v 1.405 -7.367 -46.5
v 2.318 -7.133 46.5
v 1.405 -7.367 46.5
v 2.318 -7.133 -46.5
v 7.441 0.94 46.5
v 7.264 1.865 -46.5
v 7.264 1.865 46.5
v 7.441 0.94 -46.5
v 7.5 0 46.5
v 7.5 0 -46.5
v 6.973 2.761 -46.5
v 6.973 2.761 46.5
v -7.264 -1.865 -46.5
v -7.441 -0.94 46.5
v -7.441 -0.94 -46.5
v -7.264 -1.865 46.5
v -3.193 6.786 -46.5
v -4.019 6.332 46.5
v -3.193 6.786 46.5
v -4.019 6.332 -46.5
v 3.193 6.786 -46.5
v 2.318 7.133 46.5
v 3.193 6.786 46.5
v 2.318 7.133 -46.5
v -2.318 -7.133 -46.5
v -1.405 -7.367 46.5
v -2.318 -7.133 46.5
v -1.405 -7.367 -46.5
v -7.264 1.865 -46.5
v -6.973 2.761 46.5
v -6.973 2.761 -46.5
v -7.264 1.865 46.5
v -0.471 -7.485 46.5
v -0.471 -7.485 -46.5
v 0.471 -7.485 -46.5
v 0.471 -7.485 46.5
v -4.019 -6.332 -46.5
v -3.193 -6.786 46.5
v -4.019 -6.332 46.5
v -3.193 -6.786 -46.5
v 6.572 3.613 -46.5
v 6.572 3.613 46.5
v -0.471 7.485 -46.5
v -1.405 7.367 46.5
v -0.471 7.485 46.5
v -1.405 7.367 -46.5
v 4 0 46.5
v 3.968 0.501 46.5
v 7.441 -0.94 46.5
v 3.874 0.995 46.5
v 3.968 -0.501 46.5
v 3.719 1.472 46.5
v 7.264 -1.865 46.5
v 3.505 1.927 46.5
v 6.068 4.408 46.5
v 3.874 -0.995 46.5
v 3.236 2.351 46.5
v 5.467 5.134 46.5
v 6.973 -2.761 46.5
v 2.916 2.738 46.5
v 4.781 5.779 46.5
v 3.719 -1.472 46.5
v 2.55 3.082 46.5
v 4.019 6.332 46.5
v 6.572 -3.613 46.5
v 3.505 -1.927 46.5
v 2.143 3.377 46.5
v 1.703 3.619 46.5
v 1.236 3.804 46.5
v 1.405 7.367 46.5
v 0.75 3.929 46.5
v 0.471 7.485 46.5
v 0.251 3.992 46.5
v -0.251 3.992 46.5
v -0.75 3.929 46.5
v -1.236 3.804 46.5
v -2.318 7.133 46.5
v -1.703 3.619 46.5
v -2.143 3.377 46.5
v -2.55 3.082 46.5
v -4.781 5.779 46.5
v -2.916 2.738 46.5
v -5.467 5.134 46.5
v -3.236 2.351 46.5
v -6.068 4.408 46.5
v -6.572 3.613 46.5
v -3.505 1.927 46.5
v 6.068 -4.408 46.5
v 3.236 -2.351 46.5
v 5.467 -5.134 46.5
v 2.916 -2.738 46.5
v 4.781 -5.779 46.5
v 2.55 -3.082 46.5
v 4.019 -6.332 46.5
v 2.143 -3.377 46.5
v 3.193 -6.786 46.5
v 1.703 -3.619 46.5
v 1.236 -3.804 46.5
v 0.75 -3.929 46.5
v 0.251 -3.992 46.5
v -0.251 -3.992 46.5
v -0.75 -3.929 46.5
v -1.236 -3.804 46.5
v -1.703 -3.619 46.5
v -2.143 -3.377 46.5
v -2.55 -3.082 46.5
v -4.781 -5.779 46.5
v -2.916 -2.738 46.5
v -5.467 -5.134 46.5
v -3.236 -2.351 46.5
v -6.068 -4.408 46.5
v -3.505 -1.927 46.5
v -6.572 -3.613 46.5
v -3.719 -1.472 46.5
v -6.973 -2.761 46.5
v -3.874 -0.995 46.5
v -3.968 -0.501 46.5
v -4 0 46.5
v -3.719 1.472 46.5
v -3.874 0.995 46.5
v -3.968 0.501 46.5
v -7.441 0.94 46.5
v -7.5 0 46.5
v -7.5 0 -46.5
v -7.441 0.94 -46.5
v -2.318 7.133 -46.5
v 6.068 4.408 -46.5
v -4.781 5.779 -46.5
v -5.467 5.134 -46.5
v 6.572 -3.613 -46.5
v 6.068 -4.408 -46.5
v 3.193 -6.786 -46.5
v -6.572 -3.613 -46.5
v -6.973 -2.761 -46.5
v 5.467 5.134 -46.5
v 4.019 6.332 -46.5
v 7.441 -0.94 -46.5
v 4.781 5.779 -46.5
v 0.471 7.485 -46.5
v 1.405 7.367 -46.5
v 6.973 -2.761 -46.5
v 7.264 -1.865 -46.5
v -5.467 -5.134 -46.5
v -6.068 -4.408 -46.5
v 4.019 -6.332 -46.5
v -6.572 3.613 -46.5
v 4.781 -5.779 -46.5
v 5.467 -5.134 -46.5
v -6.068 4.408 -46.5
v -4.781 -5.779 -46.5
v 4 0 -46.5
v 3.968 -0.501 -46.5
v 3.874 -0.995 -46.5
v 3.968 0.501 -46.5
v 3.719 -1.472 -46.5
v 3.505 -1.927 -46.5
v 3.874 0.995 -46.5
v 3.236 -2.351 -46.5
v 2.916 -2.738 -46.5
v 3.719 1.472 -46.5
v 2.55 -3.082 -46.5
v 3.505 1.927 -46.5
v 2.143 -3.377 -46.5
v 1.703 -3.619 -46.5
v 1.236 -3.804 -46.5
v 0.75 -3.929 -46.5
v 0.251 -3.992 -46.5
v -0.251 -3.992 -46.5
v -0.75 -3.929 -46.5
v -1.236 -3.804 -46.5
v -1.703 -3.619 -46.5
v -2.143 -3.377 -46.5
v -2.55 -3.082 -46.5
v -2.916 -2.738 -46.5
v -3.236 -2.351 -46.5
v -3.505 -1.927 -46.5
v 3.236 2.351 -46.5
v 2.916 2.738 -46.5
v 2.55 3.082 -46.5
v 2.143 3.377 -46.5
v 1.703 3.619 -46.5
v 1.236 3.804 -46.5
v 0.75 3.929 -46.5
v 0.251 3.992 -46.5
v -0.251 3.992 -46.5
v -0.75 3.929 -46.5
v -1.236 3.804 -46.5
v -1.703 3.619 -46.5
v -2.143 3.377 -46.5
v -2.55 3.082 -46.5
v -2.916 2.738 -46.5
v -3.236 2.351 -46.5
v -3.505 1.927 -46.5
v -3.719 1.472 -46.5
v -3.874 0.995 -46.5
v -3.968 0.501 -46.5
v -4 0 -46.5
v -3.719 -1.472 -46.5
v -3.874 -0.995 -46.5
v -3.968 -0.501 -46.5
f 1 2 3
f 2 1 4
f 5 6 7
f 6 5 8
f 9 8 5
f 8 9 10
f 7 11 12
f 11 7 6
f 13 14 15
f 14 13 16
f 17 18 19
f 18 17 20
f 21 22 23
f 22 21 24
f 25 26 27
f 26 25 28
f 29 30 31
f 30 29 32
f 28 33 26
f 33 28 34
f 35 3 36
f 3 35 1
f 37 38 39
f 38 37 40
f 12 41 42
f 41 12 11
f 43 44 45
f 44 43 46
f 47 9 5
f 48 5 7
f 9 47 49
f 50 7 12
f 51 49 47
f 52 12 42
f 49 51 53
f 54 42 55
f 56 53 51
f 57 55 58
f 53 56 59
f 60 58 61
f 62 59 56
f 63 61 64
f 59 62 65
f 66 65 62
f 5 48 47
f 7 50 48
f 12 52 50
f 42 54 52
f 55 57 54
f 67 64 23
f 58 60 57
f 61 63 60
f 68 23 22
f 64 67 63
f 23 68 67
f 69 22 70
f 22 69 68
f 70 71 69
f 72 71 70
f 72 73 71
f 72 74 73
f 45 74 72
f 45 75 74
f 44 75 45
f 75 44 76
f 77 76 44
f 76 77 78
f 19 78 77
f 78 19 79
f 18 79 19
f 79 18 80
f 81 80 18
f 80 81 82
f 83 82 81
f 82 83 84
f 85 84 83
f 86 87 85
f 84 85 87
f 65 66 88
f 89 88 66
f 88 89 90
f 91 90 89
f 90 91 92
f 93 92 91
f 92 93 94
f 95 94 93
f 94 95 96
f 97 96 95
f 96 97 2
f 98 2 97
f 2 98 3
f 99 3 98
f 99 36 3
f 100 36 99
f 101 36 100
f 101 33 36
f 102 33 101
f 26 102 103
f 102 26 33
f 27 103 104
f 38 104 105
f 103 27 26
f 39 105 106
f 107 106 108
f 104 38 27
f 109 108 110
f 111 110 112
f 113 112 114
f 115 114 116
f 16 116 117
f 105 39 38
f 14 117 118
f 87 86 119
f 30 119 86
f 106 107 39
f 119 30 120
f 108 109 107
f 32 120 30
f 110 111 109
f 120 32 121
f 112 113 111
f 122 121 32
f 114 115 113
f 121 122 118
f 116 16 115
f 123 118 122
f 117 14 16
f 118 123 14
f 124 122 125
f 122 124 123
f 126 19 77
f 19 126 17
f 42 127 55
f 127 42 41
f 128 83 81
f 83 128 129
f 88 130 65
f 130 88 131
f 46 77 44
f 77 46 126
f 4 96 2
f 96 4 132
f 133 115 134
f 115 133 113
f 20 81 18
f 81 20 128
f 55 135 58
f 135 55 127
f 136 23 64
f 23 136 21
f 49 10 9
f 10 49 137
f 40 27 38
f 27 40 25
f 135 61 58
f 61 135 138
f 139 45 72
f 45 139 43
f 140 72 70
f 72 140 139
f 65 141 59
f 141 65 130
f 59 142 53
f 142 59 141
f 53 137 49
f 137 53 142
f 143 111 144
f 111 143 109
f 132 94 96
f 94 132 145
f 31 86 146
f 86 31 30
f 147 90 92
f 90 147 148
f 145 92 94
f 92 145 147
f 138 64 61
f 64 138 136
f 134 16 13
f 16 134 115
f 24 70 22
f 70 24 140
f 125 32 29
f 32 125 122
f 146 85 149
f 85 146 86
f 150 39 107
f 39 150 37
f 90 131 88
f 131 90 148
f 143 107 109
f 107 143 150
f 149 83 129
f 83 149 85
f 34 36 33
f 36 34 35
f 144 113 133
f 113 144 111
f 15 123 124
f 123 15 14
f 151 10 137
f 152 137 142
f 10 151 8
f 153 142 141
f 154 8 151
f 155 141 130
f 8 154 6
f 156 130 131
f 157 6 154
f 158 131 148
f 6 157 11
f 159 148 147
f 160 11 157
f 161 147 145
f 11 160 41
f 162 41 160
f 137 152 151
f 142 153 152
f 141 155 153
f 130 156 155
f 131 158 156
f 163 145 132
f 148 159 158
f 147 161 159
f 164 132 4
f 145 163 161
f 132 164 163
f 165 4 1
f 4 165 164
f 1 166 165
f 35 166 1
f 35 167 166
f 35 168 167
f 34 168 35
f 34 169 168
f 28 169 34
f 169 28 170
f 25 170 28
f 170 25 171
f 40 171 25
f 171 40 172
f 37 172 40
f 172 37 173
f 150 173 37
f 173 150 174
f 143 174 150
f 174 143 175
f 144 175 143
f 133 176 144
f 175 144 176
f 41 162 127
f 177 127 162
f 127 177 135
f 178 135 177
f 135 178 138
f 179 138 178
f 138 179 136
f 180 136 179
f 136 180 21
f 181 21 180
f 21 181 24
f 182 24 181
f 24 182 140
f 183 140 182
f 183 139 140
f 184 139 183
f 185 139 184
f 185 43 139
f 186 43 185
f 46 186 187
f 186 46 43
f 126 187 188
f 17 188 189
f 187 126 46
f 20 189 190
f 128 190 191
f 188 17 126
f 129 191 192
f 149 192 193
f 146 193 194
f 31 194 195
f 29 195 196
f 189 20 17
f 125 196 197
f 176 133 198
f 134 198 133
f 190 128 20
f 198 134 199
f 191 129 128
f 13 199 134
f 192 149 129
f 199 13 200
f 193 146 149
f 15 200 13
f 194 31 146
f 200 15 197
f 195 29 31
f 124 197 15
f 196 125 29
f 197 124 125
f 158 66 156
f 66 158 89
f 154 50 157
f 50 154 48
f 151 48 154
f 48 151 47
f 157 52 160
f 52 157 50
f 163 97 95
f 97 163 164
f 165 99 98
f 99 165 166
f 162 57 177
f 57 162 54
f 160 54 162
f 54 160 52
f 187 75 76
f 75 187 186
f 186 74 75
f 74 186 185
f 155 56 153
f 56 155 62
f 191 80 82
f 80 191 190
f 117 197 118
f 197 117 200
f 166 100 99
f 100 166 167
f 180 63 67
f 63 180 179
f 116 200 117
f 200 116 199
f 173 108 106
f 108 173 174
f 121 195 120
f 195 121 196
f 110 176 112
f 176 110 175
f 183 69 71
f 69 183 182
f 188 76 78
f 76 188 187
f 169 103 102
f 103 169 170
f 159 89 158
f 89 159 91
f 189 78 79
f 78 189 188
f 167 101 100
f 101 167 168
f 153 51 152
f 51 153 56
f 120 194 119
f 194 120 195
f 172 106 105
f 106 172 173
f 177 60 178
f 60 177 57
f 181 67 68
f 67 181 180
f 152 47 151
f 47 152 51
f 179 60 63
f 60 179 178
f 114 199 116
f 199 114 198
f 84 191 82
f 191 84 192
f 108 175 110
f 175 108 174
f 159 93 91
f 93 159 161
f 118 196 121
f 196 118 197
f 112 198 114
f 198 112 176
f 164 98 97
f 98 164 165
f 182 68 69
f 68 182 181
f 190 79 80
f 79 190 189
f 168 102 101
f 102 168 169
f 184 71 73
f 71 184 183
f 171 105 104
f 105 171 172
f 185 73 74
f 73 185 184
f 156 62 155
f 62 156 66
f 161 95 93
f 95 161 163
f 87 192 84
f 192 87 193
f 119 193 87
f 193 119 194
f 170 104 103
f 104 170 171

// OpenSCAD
$fn = 50;


difference() {
	union() {
		translate(v = [0, 0, -46.5000000000]) {
			cylinder(h = 93, r = 7.5000000000);
		}
	}
	union() {
		translate(v = [0, 0, -100.0000000000]) {
			cylinder(h = 200, r = 4.0000000000);
		}
	}
}
